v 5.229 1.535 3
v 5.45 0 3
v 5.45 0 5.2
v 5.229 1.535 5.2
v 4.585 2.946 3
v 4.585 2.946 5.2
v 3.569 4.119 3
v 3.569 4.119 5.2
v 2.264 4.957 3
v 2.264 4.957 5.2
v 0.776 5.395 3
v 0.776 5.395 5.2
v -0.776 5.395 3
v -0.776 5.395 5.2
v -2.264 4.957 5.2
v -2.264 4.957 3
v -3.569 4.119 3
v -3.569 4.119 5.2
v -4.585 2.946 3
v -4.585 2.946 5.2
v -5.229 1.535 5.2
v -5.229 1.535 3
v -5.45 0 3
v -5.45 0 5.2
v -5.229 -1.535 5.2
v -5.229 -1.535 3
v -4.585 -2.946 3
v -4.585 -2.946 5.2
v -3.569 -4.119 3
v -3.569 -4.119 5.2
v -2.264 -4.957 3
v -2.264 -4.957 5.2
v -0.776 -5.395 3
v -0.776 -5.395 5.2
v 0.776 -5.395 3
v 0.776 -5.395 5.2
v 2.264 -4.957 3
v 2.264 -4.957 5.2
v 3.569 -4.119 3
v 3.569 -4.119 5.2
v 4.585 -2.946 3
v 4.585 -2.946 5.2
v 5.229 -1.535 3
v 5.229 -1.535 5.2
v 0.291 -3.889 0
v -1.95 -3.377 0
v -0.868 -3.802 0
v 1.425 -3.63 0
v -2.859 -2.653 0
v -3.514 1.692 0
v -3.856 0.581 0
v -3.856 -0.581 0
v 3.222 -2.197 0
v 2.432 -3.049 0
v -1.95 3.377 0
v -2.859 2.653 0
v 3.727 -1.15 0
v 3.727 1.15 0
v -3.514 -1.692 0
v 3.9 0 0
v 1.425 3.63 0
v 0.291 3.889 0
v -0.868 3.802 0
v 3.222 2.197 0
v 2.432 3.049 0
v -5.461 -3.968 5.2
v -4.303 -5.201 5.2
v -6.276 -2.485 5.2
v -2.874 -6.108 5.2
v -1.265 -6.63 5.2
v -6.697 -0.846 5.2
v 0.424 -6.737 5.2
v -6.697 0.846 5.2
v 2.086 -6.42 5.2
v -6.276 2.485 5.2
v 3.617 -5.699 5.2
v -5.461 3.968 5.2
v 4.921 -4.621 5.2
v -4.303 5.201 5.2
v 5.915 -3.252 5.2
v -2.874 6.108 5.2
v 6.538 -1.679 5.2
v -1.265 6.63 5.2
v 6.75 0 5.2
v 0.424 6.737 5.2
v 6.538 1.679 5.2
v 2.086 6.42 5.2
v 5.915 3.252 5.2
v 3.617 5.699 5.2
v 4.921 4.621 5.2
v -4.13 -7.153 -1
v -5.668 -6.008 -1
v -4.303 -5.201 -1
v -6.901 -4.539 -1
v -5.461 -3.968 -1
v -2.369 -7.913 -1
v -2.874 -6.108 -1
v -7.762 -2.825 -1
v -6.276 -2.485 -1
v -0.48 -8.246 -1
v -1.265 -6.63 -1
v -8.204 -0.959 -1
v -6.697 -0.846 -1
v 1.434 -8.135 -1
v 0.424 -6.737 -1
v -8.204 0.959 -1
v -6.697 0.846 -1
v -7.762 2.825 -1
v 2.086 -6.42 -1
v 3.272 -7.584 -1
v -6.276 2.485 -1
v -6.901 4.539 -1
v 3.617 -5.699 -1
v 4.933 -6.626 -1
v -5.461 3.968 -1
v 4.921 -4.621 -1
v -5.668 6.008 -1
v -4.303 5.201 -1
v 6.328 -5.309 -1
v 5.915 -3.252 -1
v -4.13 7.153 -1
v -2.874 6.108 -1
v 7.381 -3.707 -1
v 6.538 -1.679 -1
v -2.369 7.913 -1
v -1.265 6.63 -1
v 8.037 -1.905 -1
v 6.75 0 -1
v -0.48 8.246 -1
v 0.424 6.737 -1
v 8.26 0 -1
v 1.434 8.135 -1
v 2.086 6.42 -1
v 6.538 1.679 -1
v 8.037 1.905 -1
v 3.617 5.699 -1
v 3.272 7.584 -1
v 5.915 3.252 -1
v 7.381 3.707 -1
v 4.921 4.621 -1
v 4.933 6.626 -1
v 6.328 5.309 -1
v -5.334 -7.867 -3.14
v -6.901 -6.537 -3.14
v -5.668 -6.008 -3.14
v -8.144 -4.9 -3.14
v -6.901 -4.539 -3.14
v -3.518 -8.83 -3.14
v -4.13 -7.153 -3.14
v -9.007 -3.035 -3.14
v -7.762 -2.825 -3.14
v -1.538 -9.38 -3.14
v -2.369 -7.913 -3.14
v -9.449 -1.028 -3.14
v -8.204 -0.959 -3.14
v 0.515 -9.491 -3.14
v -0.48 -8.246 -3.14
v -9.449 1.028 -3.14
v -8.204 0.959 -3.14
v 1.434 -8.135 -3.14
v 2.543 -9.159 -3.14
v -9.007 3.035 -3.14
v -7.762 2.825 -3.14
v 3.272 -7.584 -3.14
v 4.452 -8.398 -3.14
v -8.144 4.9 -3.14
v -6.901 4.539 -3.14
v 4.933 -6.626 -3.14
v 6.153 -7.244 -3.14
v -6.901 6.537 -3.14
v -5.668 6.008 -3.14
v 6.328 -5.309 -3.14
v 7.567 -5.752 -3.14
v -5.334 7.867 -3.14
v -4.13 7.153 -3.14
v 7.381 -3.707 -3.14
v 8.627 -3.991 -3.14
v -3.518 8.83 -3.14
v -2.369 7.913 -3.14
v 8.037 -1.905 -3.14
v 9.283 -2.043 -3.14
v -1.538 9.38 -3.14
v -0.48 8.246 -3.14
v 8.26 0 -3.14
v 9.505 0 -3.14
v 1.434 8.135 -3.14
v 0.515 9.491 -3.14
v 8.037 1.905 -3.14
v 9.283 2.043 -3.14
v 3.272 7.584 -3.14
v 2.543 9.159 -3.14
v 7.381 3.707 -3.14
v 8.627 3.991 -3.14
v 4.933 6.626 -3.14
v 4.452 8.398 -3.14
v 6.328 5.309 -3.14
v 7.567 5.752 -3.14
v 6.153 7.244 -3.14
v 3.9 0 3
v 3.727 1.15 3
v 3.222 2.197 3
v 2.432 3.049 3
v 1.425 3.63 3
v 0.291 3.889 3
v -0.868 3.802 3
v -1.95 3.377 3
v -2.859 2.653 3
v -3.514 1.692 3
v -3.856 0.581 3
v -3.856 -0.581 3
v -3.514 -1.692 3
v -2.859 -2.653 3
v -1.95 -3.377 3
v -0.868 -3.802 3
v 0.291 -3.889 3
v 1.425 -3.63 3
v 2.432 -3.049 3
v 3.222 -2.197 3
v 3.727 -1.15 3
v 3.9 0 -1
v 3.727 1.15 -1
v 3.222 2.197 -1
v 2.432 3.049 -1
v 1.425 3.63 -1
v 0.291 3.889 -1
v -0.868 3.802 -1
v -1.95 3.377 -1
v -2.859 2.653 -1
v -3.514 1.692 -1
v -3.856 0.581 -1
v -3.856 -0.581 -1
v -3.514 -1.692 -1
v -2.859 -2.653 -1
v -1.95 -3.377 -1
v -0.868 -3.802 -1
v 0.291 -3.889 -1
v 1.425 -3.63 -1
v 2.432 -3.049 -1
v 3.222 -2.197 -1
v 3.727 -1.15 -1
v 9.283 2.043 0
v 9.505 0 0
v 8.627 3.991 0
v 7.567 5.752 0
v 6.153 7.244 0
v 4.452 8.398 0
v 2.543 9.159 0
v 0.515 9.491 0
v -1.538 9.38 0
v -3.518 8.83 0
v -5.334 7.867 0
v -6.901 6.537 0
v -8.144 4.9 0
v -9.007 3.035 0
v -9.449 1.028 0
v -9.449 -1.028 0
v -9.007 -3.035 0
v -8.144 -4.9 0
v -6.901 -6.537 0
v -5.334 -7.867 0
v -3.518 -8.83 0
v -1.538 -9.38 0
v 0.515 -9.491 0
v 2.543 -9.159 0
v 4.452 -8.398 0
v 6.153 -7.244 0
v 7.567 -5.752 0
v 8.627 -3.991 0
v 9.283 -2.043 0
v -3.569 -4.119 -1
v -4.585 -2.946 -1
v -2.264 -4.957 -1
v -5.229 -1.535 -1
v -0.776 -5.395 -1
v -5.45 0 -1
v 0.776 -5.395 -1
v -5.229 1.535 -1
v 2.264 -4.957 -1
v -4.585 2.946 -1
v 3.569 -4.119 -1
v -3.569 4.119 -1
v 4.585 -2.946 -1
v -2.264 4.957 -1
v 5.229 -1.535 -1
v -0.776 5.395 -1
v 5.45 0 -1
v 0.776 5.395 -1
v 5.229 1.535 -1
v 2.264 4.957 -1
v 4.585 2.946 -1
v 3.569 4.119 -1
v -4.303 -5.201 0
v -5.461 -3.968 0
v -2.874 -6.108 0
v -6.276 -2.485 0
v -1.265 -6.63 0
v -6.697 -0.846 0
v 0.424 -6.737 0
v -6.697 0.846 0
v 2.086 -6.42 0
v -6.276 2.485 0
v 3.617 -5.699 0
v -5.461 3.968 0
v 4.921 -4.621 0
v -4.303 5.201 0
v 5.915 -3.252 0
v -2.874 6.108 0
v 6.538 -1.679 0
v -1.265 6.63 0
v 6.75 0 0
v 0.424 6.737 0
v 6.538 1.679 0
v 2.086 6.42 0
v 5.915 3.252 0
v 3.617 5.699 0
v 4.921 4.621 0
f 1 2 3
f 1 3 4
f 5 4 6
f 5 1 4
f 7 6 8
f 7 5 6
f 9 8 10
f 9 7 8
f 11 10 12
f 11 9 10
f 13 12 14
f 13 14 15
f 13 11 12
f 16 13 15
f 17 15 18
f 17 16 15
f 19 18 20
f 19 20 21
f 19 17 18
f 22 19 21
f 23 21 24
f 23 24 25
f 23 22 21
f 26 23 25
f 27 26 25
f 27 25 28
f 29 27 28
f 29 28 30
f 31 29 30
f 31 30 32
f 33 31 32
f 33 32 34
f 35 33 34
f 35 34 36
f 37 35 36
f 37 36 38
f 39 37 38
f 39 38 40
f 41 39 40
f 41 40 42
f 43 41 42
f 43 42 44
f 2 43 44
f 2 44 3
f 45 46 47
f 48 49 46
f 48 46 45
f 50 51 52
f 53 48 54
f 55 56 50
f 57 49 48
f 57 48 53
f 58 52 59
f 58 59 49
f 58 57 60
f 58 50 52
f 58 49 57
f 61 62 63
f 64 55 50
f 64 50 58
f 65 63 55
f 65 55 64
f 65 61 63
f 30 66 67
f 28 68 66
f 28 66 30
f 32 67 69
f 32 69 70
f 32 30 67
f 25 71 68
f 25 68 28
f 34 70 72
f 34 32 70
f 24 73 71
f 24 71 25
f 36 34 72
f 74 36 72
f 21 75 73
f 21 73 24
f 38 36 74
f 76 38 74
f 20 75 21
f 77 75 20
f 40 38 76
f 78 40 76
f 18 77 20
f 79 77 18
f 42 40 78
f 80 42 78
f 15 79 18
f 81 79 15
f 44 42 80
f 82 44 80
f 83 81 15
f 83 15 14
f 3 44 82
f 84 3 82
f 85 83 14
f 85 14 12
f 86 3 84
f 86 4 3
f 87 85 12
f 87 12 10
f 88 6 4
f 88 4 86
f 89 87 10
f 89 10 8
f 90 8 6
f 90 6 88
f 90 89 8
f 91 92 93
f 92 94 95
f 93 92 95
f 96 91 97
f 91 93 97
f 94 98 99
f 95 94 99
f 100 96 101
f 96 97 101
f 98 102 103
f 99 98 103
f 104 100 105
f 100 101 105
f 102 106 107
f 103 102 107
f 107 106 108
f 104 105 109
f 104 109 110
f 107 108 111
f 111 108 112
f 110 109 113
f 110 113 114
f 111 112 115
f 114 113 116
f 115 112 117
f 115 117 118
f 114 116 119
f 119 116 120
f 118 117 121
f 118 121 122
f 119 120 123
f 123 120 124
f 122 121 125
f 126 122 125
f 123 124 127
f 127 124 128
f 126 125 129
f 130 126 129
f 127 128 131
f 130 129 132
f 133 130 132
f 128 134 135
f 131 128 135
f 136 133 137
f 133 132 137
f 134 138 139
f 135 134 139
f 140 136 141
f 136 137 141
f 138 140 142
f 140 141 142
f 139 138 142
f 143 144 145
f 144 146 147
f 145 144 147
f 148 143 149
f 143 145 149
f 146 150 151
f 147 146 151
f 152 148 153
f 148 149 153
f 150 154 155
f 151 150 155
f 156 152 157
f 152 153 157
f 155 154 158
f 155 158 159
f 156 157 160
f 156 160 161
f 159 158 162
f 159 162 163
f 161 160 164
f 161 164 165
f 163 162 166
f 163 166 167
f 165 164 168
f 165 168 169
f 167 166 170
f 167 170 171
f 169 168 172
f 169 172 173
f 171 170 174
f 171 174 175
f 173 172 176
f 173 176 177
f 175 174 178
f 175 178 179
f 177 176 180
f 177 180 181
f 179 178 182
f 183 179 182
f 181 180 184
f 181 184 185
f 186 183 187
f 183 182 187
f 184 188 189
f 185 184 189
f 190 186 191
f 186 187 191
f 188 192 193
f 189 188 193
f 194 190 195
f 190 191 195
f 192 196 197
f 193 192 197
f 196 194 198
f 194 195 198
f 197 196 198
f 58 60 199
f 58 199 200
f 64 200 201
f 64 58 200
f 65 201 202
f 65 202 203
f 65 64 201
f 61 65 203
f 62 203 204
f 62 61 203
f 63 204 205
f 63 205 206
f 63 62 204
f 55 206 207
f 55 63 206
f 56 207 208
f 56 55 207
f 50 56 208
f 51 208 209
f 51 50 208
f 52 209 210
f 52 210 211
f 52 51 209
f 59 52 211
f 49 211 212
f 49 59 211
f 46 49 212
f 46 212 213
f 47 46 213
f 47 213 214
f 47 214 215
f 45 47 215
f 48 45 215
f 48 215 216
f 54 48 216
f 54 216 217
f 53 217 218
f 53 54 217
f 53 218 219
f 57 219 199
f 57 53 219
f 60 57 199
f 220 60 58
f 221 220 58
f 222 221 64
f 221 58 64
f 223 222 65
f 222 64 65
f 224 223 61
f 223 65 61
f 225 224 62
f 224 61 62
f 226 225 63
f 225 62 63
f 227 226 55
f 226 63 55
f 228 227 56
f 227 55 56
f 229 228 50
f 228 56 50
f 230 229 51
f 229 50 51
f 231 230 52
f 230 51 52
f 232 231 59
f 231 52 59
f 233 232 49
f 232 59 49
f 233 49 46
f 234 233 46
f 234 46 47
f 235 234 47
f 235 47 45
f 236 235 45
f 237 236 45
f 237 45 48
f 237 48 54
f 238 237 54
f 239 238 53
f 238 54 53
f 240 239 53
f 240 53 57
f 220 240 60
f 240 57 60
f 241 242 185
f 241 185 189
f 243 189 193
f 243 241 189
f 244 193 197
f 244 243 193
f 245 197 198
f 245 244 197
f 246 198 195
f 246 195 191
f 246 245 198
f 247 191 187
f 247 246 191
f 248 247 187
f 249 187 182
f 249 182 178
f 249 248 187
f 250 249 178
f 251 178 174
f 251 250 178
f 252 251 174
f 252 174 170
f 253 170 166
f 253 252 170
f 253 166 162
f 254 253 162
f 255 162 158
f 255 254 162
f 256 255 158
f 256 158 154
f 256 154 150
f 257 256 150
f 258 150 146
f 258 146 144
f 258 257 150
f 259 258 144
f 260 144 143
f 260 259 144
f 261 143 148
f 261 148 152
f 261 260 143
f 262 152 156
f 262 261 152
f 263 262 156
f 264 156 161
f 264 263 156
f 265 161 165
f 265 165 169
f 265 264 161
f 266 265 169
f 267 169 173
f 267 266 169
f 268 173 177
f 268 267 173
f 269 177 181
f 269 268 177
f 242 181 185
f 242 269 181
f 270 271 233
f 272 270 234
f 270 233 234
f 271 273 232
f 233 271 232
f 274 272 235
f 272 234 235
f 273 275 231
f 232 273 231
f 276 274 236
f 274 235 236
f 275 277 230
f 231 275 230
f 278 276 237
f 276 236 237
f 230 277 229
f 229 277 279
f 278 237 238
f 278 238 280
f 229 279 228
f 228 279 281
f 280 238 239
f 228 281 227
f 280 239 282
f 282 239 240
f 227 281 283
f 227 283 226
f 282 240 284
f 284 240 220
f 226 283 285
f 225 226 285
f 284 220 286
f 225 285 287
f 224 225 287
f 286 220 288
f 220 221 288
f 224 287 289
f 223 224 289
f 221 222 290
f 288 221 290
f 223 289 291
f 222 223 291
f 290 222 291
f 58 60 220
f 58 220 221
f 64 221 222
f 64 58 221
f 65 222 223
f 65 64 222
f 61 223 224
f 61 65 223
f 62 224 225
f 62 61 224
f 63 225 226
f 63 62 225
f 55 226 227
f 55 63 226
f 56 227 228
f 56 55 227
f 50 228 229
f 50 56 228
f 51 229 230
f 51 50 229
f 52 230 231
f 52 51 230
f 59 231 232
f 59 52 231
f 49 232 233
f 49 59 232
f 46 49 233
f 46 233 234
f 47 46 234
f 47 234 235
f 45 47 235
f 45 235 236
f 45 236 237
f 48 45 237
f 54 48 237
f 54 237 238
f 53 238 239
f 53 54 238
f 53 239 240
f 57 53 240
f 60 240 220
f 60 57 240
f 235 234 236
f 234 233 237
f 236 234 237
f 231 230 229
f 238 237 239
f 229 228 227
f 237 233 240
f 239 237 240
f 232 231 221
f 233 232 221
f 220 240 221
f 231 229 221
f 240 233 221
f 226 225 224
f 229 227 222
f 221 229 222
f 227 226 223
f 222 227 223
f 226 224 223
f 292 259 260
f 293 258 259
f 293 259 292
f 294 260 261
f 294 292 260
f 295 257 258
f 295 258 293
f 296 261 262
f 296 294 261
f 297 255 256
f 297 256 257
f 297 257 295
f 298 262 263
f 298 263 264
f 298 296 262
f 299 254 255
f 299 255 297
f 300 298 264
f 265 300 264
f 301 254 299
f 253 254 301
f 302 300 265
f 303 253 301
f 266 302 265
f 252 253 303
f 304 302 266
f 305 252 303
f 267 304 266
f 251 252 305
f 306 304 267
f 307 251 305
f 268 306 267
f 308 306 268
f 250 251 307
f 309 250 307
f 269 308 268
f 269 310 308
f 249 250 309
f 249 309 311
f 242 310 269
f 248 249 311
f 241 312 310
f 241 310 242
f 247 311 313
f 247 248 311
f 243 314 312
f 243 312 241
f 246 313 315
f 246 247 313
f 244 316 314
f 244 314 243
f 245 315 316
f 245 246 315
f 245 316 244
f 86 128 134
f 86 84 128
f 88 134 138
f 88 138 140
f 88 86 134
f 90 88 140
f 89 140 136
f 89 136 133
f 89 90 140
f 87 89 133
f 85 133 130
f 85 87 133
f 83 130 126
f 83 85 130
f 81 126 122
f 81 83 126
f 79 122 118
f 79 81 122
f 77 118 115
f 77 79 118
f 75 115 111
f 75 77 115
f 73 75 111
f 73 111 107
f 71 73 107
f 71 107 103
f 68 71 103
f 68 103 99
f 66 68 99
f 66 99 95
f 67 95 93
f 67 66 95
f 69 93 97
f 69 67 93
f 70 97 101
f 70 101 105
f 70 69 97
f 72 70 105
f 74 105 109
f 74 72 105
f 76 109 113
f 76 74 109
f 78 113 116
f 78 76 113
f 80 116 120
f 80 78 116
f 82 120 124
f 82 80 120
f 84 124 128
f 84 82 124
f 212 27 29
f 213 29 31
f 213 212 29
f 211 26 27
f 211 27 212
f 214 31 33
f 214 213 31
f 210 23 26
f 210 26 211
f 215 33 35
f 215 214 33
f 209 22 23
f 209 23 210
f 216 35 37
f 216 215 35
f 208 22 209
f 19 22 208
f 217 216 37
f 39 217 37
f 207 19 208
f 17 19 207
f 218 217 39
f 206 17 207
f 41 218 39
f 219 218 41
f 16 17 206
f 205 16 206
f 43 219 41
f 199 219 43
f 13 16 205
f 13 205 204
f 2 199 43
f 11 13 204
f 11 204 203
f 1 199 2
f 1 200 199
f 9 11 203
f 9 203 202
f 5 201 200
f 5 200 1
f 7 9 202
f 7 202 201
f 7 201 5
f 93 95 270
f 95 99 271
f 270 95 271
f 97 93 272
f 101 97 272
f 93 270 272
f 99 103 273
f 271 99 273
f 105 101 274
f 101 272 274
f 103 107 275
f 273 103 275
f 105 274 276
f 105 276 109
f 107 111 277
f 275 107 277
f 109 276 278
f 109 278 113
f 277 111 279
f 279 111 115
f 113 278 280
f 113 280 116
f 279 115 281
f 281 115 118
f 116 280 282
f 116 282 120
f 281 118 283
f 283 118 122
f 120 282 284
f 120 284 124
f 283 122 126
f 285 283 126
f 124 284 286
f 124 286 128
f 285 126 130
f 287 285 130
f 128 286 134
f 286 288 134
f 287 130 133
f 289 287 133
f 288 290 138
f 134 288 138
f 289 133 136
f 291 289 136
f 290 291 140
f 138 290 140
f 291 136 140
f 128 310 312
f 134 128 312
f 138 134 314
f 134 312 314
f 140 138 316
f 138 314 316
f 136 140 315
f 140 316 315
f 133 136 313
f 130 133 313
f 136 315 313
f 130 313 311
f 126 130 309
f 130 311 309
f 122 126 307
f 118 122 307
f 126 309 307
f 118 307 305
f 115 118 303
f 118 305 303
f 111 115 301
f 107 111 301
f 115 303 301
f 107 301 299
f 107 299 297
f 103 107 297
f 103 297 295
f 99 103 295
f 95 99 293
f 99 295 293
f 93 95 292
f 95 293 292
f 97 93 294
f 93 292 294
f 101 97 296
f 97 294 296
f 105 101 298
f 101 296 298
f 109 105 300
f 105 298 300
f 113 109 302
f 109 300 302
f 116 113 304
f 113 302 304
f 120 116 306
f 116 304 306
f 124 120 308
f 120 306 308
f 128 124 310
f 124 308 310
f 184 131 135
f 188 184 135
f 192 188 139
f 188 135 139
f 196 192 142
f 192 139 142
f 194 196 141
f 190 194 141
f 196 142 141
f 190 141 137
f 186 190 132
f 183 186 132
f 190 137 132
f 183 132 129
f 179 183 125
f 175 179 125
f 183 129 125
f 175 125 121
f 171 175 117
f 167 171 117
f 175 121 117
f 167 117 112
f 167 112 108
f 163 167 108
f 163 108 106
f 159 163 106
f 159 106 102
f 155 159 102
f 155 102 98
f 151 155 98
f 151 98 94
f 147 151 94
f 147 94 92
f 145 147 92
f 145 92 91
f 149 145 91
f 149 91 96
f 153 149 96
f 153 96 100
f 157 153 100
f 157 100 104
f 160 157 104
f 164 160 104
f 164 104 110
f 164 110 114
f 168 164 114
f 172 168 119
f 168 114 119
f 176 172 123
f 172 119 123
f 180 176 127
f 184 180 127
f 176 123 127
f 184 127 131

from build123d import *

# Parameters (mm, degrees)
F0_R          = 9.505
F0_R_2        = 8.26
F1_DEPTH      = 3.14
F0_R_3        = 6.75
F0_R_4        = 5.45
F2_DEPTH      = 5.2
F2_DEPTH_BACK = 1
F0_R_5        = 3.9
F3_DEPTH      = 3
F3_DEPTH_BACK = 1
F4_DEPTH      = 1


with BuildPart() as f1:
    # F0 (on Top) → F1 (new body)
    with BuildSketch(Plane.XY):
        Circle(F0_R)
        Circle(F0_R_2, mode=Mode.SUBTRACT)
    extrude(amount=-F1_DEPTH)

    # F0 (on Top) → F4 (join)
    with BuildSketch(Plane.XY):
        Circle(F0_R_2)
        Circle(F0_R_3, mode=Mode.SUBTRACT)
    extrude(amount=-F4_DEPTH)


with BuildPart() as f2:
    # F0 (on Top) → F2 (new body, two sides)
    with BuildSketch(Plane.XY) as f2_sk:
        Circle(F0_R_3)
        Circle(F0_R_4, mode=Mode.SUBTRACT)
    extrude(amount=F2_DEPTH)
    extrude(f2_sk.sketch, amount=-F2_DEPTH_BACK)

    # F0 (on Top) → F3 (join, two sides)
    with BuildSketch(Plane.XY) as f3_sk:
        Circle(F0_R_4)
        Circle(F0_R_5, mode=Mode.SUBTRACT)
    extrude(amount=F3_DEPTH)
    extrude(f3_sk.sketch, amount=-F3_DEPTH_BACK)


with BuildPart() as f4:
    # F0 (on Top) → F4, piece 2 (new body)
    with BuildSketch(Plane.XY):
        Circle(F0_R_5)
    extrude(amount=-F4_DEPTH)


solid = Compound([f1.part, f2.part, f4.part])
